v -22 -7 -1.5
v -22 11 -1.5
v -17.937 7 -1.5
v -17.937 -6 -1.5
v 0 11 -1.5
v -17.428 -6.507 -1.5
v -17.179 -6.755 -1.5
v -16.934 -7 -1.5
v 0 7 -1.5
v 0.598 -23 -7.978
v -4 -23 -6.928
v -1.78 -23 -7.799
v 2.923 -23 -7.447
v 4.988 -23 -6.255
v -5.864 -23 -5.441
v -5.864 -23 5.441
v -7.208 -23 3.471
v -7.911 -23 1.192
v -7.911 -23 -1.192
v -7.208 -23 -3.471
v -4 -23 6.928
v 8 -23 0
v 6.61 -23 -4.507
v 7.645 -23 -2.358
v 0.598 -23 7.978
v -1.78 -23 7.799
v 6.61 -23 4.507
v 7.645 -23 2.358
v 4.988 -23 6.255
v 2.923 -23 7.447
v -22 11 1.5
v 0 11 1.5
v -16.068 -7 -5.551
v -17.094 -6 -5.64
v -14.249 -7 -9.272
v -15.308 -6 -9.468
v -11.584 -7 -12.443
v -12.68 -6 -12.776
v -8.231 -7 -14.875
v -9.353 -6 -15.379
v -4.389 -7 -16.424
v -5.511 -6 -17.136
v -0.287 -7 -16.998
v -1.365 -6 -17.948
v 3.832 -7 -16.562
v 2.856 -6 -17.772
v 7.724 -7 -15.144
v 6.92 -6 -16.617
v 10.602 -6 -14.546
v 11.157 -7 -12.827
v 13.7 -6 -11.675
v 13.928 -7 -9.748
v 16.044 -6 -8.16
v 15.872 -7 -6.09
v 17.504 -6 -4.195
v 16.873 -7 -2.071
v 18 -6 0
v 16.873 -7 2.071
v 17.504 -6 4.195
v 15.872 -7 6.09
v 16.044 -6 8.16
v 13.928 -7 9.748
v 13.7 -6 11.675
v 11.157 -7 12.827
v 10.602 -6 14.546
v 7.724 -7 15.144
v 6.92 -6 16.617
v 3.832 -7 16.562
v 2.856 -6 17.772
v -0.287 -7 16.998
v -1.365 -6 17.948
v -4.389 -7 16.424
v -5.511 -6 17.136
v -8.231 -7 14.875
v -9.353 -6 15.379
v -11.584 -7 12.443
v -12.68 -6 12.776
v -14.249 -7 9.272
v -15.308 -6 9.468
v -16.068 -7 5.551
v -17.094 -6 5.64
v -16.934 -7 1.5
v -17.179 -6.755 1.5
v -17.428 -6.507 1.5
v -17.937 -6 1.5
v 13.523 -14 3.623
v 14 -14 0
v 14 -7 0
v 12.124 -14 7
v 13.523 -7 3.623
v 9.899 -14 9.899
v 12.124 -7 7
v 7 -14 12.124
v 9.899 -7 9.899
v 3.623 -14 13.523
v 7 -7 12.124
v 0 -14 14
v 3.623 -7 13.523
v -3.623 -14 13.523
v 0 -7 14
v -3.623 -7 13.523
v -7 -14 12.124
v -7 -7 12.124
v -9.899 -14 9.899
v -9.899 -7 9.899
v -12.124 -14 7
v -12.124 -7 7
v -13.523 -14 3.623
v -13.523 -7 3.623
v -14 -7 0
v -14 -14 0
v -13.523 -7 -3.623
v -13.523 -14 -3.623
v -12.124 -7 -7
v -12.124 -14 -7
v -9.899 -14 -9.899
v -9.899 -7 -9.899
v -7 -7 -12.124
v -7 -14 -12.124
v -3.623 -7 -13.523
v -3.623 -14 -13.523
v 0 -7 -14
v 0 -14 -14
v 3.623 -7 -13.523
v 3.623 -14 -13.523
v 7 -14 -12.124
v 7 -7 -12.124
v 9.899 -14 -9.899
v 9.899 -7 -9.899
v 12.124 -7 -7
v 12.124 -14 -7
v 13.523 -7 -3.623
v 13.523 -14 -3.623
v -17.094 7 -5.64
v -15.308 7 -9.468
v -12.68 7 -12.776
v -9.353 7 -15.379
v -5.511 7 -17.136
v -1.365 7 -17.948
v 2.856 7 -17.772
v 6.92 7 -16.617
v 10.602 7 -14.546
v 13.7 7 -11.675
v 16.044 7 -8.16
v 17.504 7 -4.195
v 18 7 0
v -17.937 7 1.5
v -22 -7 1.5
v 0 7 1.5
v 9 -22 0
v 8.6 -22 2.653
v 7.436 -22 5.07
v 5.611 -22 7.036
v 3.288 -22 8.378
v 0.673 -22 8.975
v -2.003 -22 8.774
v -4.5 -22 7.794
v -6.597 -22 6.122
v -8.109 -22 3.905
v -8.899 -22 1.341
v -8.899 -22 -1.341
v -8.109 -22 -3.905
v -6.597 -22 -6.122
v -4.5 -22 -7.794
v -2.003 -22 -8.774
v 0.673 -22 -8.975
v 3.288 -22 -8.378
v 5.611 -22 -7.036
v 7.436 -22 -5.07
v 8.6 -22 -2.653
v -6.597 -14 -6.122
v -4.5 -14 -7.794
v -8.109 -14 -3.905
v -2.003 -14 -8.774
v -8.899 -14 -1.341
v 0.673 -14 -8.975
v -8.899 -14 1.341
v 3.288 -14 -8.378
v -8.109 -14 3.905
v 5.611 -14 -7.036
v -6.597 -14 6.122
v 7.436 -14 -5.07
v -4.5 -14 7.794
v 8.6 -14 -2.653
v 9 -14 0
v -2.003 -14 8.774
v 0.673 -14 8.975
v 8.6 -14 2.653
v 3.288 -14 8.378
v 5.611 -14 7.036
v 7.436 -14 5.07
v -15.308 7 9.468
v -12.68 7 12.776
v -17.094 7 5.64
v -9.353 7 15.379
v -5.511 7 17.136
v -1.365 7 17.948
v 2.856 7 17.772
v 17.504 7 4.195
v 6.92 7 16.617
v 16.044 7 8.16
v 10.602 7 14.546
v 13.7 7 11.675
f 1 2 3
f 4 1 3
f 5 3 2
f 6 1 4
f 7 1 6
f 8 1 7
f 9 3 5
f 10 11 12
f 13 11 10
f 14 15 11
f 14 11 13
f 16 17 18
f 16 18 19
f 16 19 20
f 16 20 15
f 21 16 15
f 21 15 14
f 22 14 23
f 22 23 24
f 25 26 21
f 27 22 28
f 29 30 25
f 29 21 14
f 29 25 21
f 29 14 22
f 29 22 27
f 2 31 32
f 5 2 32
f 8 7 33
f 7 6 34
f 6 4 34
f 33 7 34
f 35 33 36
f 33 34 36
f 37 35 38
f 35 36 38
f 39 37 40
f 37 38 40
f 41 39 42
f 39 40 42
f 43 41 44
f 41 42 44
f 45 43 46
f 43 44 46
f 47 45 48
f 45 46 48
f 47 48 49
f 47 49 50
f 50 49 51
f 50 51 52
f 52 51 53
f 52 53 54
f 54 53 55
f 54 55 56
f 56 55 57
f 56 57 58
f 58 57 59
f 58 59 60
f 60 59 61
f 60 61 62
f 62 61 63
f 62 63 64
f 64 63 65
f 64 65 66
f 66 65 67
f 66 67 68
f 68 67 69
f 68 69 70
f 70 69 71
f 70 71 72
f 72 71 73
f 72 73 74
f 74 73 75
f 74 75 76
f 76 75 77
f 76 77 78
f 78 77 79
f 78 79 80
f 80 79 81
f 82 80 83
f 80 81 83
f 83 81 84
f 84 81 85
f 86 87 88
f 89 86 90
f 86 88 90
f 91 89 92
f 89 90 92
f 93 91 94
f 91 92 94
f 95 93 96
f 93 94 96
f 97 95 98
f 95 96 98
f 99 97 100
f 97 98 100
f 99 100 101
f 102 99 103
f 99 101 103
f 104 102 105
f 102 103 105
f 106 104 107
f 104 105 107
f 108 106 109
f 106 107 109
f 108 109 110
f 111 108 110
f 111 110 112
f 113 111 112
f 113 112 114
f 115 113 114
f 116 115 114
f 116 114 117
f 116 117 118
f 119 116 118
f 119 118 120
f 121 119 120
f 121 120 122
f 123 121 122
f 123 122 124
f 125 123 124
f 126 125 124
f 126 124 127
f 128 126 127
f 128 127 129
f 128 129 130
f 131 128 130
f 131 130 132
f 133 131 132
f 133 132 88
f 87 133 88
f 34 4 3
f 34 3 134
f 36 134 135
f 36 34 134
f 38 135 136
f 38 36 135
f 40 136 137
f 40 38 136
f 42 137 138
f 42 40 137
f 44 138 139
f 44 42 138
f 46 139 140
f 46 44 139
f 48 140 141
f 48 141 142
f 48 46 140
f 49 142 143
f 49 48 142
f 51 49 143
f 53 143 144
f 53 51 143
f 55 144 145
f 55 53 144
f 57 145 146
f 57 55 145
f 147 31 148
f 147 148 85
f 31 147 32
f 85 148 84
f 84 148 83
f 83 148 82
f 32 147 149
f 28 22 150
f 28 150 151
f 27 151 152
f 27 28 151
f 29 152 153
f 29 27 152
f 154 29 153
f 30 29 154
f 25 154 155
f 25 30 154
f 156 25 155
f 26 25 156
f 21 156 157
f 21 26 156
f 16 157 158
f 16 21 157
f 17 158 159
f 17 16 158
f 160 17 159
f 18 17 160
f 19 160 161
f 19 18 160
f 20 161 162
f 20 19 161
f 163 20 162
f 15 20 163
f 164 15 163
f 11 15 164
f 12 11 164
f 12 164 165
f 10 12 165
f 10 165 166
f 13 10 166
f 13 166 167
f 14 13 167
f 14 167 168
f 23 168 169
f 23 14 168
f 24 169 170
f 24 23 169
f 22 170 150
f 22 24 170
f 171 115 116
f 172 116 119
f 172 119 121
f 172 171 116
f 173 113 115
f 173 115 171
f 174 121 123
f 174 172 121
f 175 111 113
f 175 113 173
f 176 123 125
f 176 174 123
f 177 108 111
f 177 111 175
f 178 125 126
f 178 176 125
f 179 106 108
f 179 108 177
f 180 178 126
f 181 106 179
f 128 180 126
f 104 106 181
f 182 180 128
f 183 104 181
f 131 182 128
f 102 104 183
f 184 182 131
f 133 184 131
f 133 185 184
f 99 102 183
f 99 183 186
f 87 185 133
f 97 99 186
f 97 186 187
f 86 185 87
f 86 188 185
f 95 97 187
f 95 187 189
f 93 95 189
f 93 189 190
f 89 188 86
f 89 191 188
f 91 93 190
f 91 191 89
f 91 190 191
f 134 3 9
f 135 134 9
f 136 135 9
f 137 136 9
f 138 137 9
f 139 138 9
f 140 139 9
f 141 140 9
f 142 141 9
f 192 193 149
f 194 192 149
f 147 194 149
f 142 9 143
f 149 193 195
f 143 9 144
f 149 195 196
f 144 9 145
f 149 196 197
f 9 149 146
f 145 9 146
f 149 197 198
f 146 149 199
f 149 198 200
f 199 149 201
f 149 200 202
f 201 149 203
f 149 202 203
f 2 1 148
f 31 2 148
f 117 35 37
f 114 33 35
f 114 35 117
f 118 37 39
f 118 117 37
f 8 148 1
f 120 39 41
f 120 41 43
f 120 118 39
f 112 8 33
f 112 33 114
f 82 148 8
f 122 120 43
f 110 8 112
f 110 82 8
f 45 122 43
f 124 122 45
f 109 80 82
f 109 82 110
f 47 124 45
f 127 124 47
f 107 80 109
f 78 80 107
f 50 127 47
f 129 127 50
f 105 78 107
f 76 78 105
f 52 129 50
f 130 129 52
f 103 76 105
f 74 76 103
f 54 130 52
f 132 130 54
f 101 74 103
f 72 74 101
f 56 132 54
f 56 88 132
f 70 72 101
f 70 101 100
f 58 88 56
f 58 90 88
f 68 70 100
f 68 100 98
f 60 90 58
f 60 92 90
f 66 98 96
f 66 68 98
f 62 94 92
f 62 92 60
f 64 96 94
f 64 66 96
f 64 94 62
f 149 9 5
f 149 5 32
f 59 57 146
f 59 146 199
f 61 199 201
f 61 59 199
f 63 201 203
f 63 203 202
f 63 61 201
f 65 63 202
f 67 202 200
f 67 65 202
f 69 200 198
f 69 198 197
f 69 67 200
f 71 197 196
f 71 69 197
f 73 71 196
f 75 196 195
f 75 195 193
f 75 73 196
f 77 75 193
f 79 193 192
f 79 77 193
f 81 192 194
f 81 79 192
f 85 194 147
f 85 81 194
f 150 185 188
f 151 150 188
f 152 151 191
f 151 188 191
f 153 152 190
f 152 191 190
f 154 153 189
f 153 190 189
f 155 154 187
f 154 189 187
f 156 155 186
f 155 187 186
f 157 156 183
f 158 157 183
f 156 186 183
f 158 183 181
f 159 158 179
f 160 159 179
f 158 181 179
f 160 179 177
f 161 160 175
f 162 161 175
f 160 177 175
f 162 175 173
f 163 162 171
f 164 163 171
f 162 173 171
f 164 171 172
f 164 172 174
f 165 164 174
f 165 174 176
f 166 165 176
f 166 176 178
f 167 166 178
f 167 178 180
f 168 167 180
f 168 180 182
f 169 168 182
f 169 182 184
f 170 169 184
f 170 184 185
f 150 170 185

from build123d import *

# Parameters (mm, degrees)
F0_R          = 18
F1_DEPTH      = 7
F2_R          = 14
F3_DEPTH      = 14
F4_R          = 9
F5_DEPTH      = 23
F6_W          = 22
F6_H          = 3
F7_DEPTH      = 7
F7_DEPTH_BACK = 11
F8_SIZE       = 1
F9_SIZE       = 1


with BuildPart() as f1:
    # F0 (on Front) → F1 (new body, symmetric)
    with BuildSketch(Plane.XZ):
        Circle(F0_R)
    extrude(amount=F1_DEPTH, both=True)

    # F2 (on Front) → F3 (join)
    with BuildSketch(Plane.XZ):
        Circle(F2_R)
    extrude(amount=F3_DEPTH)

    # F4 (on Front) → F5 (join)
    with BuildSketch(Plane.XZ):
        Circle(F4_R)
    extrude(amount=F5_DEPTH)

    # F6 (on Front) → F7 (join, two sides)
    with BuildSketch(Plane.XZ) as f7_sk:
        with Locations((-11, 0)):
            Rectangle(F6_W, F6_H)
    extrude(amount=F7_DEPTH)
    extrude(f7_sk.sketch, amount=-F7_DEPTH_BACK)

    # F8
    f8_edges = [f1.edges().sort_by_distance(p)[0] for p in [
        (-9, -23, 0),
    ]]
    chamfer(f8_edges, length=F8_SIZE)

    # F9
    f9_edges = [f1.edges().sort_by_distance(p)[0] for p in [
        (0.750653, -7, -17.984341),
        (0.750653, -7, 17.984341),
    ]]
    chamfer(f9_edges, length=F9_SIZE)


solid = f1.part
